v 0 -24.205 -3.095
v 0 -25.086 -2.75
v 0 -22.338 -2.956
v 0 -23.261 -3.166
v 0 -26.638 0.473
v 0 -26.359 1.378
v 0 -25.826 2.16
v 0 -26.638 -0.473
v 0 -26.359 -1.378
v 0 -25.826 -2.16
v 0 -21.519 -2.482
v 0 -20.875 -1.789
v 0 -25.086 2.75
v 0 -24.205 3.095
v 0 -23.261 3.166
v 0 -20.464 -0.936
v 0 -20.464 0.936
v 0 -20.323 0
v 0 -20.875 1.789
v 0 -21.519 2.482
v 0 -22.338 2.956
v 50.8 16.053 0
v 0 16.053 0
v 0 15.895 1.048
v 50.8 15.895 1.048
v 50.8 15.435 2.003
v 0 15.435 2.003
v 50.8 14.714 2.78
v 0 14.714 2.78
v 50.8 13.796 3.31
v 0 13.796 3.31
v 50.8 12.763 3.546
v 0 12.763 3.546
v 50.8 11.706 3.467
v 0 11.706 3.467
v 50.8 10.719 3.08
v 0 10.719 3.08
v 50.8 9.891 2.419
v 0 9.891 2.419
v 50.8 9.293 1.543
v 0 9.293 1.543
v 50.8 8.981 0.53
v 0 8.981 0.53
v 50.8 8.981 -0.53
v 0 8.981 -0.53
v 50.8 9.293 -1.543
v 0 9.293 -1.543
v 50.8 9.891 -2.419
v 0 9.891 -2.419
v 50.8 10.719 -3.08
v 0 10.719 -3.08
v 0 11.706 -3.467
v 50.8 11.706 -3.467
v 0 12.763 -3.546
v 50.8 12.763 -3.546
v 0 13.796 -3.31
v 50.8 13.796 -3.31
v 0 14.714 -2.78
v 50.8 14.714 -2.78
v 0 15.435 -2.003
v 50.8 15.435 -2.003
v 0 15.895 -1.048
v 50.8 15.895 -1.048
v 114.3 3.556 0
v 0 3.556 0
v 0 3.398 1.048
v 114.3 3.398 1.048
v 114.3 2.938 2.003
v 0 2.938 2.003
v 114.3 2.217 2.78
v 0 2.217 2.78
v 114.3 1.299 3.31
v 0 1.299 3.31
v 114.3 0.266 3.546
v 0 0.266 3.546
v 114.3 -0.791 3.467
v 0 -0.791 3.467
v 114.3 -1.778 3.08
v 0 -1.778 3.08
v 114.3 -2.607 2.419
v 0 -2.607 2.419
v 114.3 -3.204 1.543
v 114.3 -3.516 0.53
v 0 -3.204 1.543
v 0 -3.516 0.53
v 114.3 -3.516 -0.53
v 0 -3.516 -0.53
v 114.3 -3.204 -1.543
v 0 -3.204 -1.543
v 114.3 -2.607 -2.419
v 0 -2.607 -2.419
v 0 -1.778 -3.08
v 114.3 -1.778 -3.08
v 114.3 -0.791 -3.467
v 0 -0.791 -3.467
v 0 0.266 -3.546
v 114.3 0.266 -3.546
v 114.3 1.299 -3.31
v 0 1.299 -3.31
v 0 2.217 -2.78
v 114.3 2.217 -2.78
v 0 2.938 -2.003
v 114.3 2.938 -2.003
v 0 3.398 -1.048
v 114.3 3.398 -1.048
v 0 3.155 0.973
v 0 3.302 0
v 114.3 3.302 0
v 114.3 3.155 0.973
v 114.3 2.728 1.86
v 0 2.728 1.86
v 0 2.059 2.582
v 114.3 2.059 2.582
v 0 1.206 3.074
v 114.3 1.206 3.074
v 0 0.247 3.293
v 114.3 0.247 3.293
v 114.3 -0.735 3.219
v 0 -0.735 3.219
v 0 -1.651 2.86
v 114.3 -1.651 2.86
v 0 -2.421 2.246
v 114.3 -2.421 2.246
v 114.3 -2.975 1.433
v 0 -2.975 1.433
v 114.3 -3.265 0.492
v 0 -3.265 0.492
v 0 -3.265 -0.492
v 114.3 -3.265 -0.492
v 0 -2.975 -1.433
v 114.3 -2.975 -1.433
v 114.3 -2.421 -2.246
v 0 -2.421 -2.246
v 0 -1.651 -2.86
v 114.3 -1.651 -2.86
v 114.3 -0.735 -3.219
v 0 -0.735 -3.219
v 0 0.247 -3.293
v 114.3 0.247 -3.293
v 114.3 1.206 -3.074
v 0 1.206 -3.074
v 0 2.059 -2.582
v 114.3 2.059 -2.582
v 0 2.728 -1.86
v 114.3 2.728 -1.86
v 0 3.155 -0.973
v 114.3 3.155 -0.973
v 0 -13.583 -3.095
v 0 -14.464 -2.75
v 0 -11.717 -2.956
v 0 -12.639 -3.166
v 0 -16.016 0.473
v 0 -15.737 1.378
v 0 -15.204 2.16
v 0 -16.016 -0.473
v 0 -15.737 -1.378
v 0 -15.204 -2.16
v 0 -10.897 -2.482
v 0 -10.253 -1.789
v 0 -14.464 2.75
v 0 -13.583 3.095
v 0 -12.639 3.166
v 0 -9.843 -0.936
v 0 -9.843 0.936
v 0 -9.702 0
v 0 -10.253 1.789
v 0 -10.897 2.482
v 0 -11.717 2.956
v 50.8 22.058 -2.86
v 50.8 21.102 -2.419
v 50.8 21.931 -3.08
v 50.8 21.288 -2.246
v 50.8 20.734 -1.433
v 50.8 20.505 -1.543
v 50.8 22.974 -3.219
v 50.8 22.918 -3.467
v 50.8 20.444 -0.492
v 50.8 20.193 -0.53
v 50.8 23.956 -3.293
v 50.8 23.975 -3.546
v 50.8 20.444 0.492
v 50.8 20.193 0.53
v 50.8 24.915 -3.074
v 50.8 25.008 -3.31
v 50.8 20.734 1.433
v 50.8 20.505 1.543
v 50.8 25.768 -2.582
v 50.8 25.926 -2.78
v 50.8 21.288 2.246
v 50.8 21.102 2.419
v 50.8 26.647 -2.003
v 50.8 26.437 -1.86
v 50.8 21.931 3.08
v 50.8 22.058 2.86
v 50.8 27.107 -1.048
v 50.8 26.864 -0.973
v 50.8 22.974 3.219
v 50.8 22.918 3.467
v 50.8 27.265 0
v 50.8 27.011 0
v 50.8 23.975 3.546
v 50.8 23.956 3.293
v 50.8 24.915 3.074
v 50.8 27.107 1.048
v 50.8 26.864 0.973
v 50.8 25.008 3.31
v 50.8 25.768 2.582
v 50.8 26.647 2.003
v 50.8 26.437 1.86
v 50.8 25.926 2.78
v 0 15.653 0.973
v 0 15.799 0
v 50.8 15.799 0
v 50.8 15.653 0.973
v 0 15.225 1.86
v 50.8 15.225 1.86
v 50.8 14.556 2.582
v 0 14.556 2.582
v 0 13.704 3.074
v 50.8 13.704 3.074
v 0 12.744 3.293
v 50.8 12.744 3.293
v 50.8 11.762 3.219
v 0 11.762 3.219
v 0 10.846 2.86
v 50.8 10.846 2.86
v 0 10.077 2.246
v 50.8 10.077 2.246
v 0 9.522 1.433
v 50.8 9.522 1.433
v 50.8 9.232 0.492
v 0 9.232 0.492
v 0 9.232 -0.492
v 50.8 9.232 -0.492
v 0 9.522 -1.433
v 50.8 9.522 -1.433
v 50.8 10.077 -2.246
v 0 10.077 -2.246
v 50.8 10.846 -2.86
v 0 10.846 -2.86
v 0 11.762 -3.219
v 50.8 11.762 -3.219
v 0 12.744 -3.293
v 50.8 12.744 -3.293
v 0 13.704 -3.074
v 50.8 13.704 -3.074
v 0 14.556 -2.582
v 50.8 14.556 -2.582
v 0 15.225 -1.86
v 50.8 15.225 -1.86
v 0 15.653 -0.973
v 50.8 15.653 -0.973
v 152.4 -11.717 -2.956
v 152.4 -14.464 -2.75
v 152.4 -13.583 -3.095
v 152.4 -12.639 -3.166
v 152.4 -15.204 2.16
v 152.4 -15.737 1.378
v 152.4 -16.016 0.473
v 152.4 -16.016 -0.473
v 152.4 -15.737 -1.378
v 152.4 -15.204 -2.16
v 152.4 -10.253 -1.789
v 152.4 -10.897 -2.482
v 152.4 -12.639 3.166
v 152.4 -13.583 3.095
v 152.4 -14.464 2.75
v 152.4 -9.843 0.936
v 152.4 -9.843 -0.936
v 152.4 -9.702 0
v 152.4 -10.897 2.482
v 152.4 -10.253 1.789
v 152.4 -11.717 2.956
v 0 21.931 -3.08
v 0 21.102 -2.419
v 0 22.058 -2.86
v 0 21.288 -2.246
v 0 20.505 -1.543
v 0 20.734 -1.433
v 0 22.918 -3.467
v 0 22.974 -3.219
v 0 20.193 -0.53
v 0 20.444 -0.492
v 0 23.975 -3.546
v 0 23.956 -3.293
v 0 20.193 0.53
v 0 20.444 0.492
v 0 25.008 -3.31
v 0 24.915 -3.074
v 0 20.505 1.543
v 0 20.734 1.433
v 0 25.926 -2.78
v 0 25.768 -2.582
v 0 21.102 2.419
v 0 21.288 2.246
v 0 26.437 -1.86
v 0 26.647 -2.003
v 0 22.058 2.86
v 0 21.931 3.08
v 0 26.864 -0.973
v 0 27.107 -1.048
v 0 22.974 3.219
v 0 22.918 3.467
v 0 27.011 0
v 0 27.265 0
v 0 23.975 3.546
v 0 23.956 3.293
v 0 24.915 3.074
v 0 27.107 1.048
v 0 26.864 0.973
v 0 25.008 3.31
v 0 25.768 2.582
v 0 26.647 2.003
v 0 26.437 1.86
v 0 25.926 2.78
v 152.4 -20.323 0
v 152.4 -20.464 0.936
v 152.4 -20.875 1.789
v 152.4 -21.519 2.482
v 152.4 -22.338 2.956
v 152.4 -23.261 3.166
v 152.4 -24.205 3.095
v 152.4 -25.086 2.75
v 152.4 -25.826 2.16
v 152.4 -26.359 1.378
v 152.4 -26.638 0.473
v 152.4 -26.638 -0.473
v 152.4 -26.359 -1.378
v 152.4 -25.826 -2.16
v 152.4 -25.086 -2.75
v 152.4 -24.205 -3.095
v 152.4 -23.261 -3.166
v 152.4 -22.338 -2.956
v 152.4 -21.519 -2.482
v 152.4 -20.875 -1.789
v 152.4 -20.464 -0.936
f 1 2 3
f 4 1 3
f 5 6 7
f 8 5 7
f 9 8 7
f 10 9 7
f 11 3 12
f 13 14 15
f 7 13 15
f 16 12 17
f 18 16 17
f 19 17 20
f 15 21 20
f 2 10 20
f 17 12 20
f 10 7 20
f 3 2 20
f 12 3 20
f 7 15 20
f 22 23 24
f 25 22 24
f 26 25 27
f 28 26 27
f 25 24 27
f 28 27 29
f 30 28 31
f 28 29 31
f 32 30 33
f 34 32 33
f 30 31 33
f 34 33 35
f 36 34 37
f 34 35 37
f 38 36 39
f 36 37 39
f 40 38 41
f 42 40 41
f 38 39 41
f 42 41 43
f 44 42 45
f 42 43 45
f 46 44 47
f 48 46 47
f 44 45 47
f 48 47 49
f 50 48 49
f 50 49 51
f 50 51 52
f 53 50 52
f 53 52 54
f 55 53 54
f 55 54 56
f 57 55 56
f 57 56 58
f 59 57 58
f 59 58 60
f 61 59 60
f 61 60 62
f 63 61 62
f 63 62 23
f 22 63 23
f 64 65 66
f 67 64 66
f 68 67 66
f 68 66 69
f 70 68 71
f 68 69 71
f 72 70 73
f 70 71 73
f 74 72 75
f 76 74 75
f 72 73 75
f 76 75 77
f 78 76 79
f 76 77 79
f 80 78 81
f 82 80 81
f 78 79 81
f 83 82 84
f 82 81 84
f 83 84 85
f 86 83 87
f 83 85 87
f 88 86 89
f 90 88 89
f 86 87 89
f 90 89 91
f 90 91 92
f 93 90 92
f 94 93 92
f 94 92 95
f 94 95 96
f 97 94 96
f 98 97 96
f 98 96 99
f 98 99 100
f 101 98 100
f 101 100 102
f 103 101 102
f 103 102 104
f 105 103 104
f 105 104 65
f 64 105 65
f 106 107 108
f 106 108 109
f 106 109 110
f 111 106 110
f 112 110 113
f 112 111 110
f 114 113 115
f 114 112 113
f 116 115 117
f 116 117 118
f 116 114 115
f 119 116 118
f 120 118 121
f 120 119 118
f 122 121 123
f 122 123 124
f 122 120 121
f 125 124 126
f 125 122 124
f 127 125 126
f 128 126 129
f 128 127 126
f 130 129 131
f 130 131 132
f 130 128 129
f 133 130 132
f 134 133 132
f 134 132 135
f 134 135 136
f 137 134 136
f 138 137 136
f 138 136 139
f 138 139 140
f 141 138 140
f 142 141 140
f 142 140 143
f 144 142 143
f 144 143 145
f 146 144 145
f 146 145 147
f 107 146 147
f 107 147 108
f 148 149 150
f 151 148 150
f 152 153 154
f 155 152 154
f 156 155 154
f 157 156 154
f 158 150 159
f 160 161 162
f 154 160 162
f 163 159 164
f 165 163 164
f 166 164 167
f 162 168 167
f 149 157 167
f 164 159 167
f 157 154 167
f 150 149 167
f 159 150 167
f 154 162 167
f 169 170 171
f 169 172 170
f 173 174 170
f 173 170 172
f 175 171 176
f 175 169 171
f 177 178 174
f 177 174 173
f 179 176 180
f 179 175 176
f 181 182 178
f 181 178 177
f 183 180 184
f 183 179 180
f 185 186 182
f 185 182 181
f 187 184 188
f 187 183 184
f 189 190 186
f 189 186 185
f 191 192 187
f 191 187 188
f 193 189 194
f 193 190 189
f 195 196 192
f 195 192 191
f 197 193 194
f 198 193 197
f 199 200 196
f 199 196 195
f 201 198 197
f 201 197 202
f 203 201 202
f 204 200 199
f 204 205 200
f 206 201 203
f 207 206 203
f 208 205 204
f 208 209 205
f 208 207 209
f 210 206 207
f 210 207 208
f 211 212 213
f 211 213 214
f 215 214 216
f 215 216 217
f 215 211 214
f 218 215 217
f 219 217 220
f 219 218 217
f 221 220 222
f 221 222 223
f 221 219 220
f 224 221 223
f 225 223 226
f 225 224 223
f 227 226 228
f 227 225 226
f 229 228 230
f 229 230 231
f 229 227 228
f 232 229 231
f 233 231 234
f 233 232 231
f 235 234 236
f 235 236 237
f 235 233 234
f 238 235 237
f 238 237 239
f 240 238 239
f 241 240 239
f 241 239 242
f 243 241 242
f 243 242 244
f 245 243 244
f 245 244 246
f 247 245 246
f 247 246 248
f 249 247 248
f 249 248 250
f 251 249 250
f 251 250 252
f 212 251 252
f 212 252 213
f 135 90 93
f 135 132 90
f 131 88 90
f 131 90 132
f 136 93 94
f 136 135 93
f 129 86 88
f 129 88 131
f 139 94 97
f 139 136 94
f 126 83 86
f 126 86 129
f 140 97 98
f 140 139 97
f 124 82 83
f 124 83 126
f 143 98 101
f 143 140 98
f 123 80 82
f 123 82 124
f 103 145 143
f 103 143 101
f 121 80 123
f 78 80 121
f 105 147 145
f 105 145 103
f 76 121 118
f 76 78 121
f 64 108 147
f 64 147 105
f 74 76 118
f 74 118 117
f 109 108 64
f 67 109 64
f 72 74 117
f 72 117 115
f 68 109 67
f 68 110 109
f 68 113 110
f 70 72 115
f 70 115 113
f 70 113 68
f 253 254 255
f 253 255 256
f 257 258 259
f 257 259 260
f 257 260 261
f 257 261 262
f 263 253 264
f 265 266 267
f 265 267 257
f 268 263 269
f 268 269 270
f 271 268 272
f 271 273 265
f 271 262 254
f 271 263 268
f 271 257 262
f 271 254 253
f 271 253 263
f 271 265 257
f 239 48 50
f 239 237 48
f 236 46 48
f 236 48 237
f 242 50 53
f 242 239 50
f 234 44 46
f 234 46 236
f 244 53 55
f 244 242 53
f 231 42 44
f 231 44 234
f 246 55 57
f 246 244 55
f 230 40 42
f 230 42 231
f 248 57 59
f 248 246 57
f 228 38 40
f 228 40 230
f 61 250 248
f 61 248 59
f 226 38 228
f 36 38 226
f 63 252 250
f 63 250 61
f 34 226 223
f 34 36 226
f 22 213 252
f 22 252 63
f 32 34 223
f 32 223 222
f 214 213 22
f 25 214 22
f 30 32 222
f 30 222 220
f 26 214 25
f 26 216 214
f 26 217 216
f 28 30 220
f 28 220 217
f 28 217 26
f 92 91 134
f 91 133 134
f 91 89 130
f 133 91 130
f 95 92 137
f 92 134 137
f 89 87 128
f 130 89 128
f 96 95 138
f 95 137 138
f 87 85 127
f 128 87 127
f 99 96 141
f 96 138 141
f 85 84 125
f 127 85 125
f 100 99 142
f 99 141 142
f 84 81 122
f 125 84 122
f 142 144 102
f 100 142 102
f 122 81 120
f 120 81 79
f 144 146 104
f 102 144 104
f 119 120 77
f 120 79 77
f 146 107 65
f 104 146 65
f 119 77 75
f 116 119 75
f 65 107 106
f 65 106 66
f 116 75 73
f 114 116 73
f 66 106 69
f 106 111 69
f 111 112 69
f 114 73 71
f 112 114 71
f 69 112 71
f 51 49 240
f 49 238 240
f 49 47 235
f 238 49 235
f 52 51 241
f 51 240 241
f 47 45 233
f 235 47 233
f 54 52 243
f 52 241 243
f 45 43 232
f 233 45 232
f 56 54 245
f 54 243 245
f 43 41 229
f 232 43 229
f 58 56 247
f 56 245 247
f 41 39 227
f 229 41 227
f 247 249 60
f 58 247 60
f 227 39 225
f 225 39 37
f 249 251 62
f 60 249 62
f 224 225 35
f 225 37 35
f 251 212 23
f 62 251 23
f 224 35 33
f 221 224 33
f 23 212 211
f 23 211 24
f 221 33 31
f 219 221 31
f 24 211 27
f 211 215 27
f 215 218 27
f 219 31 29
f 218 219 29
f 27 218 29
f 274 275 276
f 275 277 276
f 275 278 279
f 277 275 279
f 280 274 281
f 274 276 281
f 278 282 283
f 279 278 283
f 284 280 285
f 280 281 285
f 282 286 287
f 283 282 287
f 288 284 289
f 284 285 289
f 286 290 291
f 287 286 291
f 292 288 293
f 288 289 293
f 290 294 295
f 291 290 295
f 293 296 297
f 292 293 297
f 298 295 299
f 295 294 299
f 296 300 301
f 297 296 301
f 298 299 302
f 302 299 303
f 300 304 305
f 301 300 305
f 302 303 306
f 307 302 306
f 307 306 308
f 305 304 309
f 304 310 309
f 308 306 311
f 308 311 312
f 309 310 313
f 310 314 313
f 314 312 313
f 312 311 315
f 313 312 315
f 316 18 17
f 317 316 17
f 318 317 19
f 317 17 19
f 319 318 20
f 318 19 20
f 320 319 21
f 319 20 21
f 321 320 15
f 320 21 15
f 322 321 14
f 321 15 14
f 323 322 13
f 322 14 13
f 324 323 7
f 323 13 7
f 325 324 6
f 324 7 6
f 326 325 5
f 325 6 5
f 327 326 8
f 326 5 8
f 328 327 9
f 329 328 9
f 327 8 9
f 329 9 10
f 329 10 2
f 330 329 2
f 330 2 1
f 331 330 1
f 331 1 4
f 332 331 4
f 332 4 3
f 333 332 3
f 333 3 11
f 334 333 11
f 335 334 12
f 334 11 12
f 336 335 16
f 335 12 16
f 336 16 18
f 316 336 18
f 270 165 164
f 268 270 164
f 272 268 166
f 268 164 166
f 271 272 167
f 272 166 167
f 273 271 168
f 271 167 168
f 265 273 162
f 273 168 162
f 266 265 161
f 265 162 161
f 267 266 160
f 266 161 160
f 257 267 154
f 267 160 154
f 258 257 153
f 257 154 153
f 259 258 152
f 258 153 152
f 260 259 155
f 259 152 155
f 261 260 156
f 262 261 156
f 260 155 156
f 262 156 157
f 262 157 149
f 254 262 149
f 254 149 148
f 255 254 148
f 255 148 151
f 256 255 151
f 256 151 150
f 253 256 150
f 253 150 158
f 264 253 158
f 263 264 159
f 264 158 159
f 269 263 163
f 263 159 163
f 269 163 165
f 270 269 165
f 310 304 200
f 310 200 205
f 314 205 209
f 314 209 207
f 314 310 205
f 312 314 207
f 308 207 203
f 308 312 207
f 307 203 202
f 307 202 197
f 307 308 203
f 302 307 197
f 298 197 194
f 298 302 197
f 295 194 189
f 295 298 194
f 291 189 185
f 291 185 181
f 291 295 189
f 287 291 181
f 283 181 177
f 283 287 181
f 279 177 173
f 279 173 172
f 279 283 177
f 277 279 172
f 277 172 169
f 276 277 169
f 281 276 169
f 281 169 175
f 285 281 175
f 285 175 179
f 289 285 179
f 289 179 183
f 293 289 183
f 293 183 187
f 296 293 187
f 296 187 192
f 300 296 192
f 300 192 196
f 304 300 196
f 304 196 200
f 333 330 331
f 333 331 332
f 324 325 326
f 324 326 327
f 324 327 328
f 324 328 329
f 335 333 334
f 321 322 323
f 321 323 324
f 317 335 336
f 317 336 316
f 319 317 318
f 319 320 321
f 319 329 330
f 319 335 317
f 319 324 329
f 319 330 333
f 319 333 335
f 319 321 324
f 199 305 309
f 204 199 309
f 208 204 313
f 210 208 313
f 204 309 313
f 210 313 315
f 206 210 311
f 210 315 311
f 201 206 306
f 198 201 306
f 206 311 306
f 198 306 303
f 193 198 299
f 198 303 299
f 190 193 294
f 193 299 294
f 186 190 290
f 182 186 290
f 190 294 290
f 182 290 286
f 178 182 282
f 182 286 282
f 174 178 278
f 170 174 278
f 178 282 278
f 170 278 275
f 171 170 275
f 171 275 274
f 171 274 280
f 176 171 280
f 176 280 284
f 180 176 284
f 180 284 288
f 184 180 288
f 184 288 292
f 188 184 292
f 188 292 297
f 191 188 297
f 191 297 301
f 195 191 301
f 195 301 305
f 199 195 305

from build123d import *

# Parameters (mm, degrees)
F0_R        = 3.556
F0_R_2      = 3.302
F0_R_3      = 3.175
F1_DEPTH    = 152.4
F1_FACE_R   = 3.556
F1_FACE_R_2 = 3.302
F2_DEPTH    = 101.6
F3_DEPTH    = 101.6
F4_DEPTH    = 38.1


with BuildPart() as f1:
    # F0 (on Right) → F1 (new body)
    with BuildSketch(Plane.YZ):
        Circle(F0_R)
        Circle(F0_R_2, mode=Mode.SUBTRACT)
        with Locations((12.497241, 0)):
            Circle(F0_R)
        with Locations((12.497241, 0)):
            Circle(F0_R_2, mode=Mode.SUBTRACT)
        with Locations((-12.876584, 0)):
            Circle(F0_R_3)
        with Locations((-23.498186, 0)):
            Circle(F0_R_3)
        with Locations((23.708932, 0)):
            Circle(F0_R)
        with Locations((23.708932, 0)):
            Circle(F0_R_2, mode=Mode.SUBTRACT)
    extrude(amount=F1_DEPTH)

    # F1_face (on face) → F2 (cut)
    with BuildSketch(Plane(origin=(152.4, 23.708932, 0), x_dir=(0, 1, 0), z_dir=(1, 0, 0))):
        Circle(F1_FACE_R)
        Circle(F1_FACE_R_2, mode=Mode.SUBTRACT)
    extrude(amount=-F2_DEPTH, mode=Mode.SUBTRACT)

    # F1_face (on face) → F3 (cut)
    with BuildSketch(Plane(origin=(152.4, 23.708932, 0), x_dir=(0, 1, 0), z_dir=(1, 0, 0))):
        with Locations((-11.211691, 0)):
            Circle(F1_FACE_R)
        with Locations((-11.211691, 0)):
            Circle(F1_FACE_R_2, mode=Mode.SUBTRACT)
    extrude(amount=-F3_DEPTH, mode=Mode.SUBTRACT)

    # F1_face (on face) → F4 (cut)
    with BuildSketch(Plane(origin=(152.4, 23.708932, 0), x_dir=(0, 1, 0), z_dir=(1, 0, 0))):
        with Locations((-23.708932, 0)):
            Circle(F1_FACE_R)
        with Locations((-23.708932, 0)):
            Circle(F1_FACE_R_2, mode=Mode.SUBTRACT)
    extrude(amount=-F4_DEPTH, mode=Mode.SUBTRACT)


solid = f1.part
